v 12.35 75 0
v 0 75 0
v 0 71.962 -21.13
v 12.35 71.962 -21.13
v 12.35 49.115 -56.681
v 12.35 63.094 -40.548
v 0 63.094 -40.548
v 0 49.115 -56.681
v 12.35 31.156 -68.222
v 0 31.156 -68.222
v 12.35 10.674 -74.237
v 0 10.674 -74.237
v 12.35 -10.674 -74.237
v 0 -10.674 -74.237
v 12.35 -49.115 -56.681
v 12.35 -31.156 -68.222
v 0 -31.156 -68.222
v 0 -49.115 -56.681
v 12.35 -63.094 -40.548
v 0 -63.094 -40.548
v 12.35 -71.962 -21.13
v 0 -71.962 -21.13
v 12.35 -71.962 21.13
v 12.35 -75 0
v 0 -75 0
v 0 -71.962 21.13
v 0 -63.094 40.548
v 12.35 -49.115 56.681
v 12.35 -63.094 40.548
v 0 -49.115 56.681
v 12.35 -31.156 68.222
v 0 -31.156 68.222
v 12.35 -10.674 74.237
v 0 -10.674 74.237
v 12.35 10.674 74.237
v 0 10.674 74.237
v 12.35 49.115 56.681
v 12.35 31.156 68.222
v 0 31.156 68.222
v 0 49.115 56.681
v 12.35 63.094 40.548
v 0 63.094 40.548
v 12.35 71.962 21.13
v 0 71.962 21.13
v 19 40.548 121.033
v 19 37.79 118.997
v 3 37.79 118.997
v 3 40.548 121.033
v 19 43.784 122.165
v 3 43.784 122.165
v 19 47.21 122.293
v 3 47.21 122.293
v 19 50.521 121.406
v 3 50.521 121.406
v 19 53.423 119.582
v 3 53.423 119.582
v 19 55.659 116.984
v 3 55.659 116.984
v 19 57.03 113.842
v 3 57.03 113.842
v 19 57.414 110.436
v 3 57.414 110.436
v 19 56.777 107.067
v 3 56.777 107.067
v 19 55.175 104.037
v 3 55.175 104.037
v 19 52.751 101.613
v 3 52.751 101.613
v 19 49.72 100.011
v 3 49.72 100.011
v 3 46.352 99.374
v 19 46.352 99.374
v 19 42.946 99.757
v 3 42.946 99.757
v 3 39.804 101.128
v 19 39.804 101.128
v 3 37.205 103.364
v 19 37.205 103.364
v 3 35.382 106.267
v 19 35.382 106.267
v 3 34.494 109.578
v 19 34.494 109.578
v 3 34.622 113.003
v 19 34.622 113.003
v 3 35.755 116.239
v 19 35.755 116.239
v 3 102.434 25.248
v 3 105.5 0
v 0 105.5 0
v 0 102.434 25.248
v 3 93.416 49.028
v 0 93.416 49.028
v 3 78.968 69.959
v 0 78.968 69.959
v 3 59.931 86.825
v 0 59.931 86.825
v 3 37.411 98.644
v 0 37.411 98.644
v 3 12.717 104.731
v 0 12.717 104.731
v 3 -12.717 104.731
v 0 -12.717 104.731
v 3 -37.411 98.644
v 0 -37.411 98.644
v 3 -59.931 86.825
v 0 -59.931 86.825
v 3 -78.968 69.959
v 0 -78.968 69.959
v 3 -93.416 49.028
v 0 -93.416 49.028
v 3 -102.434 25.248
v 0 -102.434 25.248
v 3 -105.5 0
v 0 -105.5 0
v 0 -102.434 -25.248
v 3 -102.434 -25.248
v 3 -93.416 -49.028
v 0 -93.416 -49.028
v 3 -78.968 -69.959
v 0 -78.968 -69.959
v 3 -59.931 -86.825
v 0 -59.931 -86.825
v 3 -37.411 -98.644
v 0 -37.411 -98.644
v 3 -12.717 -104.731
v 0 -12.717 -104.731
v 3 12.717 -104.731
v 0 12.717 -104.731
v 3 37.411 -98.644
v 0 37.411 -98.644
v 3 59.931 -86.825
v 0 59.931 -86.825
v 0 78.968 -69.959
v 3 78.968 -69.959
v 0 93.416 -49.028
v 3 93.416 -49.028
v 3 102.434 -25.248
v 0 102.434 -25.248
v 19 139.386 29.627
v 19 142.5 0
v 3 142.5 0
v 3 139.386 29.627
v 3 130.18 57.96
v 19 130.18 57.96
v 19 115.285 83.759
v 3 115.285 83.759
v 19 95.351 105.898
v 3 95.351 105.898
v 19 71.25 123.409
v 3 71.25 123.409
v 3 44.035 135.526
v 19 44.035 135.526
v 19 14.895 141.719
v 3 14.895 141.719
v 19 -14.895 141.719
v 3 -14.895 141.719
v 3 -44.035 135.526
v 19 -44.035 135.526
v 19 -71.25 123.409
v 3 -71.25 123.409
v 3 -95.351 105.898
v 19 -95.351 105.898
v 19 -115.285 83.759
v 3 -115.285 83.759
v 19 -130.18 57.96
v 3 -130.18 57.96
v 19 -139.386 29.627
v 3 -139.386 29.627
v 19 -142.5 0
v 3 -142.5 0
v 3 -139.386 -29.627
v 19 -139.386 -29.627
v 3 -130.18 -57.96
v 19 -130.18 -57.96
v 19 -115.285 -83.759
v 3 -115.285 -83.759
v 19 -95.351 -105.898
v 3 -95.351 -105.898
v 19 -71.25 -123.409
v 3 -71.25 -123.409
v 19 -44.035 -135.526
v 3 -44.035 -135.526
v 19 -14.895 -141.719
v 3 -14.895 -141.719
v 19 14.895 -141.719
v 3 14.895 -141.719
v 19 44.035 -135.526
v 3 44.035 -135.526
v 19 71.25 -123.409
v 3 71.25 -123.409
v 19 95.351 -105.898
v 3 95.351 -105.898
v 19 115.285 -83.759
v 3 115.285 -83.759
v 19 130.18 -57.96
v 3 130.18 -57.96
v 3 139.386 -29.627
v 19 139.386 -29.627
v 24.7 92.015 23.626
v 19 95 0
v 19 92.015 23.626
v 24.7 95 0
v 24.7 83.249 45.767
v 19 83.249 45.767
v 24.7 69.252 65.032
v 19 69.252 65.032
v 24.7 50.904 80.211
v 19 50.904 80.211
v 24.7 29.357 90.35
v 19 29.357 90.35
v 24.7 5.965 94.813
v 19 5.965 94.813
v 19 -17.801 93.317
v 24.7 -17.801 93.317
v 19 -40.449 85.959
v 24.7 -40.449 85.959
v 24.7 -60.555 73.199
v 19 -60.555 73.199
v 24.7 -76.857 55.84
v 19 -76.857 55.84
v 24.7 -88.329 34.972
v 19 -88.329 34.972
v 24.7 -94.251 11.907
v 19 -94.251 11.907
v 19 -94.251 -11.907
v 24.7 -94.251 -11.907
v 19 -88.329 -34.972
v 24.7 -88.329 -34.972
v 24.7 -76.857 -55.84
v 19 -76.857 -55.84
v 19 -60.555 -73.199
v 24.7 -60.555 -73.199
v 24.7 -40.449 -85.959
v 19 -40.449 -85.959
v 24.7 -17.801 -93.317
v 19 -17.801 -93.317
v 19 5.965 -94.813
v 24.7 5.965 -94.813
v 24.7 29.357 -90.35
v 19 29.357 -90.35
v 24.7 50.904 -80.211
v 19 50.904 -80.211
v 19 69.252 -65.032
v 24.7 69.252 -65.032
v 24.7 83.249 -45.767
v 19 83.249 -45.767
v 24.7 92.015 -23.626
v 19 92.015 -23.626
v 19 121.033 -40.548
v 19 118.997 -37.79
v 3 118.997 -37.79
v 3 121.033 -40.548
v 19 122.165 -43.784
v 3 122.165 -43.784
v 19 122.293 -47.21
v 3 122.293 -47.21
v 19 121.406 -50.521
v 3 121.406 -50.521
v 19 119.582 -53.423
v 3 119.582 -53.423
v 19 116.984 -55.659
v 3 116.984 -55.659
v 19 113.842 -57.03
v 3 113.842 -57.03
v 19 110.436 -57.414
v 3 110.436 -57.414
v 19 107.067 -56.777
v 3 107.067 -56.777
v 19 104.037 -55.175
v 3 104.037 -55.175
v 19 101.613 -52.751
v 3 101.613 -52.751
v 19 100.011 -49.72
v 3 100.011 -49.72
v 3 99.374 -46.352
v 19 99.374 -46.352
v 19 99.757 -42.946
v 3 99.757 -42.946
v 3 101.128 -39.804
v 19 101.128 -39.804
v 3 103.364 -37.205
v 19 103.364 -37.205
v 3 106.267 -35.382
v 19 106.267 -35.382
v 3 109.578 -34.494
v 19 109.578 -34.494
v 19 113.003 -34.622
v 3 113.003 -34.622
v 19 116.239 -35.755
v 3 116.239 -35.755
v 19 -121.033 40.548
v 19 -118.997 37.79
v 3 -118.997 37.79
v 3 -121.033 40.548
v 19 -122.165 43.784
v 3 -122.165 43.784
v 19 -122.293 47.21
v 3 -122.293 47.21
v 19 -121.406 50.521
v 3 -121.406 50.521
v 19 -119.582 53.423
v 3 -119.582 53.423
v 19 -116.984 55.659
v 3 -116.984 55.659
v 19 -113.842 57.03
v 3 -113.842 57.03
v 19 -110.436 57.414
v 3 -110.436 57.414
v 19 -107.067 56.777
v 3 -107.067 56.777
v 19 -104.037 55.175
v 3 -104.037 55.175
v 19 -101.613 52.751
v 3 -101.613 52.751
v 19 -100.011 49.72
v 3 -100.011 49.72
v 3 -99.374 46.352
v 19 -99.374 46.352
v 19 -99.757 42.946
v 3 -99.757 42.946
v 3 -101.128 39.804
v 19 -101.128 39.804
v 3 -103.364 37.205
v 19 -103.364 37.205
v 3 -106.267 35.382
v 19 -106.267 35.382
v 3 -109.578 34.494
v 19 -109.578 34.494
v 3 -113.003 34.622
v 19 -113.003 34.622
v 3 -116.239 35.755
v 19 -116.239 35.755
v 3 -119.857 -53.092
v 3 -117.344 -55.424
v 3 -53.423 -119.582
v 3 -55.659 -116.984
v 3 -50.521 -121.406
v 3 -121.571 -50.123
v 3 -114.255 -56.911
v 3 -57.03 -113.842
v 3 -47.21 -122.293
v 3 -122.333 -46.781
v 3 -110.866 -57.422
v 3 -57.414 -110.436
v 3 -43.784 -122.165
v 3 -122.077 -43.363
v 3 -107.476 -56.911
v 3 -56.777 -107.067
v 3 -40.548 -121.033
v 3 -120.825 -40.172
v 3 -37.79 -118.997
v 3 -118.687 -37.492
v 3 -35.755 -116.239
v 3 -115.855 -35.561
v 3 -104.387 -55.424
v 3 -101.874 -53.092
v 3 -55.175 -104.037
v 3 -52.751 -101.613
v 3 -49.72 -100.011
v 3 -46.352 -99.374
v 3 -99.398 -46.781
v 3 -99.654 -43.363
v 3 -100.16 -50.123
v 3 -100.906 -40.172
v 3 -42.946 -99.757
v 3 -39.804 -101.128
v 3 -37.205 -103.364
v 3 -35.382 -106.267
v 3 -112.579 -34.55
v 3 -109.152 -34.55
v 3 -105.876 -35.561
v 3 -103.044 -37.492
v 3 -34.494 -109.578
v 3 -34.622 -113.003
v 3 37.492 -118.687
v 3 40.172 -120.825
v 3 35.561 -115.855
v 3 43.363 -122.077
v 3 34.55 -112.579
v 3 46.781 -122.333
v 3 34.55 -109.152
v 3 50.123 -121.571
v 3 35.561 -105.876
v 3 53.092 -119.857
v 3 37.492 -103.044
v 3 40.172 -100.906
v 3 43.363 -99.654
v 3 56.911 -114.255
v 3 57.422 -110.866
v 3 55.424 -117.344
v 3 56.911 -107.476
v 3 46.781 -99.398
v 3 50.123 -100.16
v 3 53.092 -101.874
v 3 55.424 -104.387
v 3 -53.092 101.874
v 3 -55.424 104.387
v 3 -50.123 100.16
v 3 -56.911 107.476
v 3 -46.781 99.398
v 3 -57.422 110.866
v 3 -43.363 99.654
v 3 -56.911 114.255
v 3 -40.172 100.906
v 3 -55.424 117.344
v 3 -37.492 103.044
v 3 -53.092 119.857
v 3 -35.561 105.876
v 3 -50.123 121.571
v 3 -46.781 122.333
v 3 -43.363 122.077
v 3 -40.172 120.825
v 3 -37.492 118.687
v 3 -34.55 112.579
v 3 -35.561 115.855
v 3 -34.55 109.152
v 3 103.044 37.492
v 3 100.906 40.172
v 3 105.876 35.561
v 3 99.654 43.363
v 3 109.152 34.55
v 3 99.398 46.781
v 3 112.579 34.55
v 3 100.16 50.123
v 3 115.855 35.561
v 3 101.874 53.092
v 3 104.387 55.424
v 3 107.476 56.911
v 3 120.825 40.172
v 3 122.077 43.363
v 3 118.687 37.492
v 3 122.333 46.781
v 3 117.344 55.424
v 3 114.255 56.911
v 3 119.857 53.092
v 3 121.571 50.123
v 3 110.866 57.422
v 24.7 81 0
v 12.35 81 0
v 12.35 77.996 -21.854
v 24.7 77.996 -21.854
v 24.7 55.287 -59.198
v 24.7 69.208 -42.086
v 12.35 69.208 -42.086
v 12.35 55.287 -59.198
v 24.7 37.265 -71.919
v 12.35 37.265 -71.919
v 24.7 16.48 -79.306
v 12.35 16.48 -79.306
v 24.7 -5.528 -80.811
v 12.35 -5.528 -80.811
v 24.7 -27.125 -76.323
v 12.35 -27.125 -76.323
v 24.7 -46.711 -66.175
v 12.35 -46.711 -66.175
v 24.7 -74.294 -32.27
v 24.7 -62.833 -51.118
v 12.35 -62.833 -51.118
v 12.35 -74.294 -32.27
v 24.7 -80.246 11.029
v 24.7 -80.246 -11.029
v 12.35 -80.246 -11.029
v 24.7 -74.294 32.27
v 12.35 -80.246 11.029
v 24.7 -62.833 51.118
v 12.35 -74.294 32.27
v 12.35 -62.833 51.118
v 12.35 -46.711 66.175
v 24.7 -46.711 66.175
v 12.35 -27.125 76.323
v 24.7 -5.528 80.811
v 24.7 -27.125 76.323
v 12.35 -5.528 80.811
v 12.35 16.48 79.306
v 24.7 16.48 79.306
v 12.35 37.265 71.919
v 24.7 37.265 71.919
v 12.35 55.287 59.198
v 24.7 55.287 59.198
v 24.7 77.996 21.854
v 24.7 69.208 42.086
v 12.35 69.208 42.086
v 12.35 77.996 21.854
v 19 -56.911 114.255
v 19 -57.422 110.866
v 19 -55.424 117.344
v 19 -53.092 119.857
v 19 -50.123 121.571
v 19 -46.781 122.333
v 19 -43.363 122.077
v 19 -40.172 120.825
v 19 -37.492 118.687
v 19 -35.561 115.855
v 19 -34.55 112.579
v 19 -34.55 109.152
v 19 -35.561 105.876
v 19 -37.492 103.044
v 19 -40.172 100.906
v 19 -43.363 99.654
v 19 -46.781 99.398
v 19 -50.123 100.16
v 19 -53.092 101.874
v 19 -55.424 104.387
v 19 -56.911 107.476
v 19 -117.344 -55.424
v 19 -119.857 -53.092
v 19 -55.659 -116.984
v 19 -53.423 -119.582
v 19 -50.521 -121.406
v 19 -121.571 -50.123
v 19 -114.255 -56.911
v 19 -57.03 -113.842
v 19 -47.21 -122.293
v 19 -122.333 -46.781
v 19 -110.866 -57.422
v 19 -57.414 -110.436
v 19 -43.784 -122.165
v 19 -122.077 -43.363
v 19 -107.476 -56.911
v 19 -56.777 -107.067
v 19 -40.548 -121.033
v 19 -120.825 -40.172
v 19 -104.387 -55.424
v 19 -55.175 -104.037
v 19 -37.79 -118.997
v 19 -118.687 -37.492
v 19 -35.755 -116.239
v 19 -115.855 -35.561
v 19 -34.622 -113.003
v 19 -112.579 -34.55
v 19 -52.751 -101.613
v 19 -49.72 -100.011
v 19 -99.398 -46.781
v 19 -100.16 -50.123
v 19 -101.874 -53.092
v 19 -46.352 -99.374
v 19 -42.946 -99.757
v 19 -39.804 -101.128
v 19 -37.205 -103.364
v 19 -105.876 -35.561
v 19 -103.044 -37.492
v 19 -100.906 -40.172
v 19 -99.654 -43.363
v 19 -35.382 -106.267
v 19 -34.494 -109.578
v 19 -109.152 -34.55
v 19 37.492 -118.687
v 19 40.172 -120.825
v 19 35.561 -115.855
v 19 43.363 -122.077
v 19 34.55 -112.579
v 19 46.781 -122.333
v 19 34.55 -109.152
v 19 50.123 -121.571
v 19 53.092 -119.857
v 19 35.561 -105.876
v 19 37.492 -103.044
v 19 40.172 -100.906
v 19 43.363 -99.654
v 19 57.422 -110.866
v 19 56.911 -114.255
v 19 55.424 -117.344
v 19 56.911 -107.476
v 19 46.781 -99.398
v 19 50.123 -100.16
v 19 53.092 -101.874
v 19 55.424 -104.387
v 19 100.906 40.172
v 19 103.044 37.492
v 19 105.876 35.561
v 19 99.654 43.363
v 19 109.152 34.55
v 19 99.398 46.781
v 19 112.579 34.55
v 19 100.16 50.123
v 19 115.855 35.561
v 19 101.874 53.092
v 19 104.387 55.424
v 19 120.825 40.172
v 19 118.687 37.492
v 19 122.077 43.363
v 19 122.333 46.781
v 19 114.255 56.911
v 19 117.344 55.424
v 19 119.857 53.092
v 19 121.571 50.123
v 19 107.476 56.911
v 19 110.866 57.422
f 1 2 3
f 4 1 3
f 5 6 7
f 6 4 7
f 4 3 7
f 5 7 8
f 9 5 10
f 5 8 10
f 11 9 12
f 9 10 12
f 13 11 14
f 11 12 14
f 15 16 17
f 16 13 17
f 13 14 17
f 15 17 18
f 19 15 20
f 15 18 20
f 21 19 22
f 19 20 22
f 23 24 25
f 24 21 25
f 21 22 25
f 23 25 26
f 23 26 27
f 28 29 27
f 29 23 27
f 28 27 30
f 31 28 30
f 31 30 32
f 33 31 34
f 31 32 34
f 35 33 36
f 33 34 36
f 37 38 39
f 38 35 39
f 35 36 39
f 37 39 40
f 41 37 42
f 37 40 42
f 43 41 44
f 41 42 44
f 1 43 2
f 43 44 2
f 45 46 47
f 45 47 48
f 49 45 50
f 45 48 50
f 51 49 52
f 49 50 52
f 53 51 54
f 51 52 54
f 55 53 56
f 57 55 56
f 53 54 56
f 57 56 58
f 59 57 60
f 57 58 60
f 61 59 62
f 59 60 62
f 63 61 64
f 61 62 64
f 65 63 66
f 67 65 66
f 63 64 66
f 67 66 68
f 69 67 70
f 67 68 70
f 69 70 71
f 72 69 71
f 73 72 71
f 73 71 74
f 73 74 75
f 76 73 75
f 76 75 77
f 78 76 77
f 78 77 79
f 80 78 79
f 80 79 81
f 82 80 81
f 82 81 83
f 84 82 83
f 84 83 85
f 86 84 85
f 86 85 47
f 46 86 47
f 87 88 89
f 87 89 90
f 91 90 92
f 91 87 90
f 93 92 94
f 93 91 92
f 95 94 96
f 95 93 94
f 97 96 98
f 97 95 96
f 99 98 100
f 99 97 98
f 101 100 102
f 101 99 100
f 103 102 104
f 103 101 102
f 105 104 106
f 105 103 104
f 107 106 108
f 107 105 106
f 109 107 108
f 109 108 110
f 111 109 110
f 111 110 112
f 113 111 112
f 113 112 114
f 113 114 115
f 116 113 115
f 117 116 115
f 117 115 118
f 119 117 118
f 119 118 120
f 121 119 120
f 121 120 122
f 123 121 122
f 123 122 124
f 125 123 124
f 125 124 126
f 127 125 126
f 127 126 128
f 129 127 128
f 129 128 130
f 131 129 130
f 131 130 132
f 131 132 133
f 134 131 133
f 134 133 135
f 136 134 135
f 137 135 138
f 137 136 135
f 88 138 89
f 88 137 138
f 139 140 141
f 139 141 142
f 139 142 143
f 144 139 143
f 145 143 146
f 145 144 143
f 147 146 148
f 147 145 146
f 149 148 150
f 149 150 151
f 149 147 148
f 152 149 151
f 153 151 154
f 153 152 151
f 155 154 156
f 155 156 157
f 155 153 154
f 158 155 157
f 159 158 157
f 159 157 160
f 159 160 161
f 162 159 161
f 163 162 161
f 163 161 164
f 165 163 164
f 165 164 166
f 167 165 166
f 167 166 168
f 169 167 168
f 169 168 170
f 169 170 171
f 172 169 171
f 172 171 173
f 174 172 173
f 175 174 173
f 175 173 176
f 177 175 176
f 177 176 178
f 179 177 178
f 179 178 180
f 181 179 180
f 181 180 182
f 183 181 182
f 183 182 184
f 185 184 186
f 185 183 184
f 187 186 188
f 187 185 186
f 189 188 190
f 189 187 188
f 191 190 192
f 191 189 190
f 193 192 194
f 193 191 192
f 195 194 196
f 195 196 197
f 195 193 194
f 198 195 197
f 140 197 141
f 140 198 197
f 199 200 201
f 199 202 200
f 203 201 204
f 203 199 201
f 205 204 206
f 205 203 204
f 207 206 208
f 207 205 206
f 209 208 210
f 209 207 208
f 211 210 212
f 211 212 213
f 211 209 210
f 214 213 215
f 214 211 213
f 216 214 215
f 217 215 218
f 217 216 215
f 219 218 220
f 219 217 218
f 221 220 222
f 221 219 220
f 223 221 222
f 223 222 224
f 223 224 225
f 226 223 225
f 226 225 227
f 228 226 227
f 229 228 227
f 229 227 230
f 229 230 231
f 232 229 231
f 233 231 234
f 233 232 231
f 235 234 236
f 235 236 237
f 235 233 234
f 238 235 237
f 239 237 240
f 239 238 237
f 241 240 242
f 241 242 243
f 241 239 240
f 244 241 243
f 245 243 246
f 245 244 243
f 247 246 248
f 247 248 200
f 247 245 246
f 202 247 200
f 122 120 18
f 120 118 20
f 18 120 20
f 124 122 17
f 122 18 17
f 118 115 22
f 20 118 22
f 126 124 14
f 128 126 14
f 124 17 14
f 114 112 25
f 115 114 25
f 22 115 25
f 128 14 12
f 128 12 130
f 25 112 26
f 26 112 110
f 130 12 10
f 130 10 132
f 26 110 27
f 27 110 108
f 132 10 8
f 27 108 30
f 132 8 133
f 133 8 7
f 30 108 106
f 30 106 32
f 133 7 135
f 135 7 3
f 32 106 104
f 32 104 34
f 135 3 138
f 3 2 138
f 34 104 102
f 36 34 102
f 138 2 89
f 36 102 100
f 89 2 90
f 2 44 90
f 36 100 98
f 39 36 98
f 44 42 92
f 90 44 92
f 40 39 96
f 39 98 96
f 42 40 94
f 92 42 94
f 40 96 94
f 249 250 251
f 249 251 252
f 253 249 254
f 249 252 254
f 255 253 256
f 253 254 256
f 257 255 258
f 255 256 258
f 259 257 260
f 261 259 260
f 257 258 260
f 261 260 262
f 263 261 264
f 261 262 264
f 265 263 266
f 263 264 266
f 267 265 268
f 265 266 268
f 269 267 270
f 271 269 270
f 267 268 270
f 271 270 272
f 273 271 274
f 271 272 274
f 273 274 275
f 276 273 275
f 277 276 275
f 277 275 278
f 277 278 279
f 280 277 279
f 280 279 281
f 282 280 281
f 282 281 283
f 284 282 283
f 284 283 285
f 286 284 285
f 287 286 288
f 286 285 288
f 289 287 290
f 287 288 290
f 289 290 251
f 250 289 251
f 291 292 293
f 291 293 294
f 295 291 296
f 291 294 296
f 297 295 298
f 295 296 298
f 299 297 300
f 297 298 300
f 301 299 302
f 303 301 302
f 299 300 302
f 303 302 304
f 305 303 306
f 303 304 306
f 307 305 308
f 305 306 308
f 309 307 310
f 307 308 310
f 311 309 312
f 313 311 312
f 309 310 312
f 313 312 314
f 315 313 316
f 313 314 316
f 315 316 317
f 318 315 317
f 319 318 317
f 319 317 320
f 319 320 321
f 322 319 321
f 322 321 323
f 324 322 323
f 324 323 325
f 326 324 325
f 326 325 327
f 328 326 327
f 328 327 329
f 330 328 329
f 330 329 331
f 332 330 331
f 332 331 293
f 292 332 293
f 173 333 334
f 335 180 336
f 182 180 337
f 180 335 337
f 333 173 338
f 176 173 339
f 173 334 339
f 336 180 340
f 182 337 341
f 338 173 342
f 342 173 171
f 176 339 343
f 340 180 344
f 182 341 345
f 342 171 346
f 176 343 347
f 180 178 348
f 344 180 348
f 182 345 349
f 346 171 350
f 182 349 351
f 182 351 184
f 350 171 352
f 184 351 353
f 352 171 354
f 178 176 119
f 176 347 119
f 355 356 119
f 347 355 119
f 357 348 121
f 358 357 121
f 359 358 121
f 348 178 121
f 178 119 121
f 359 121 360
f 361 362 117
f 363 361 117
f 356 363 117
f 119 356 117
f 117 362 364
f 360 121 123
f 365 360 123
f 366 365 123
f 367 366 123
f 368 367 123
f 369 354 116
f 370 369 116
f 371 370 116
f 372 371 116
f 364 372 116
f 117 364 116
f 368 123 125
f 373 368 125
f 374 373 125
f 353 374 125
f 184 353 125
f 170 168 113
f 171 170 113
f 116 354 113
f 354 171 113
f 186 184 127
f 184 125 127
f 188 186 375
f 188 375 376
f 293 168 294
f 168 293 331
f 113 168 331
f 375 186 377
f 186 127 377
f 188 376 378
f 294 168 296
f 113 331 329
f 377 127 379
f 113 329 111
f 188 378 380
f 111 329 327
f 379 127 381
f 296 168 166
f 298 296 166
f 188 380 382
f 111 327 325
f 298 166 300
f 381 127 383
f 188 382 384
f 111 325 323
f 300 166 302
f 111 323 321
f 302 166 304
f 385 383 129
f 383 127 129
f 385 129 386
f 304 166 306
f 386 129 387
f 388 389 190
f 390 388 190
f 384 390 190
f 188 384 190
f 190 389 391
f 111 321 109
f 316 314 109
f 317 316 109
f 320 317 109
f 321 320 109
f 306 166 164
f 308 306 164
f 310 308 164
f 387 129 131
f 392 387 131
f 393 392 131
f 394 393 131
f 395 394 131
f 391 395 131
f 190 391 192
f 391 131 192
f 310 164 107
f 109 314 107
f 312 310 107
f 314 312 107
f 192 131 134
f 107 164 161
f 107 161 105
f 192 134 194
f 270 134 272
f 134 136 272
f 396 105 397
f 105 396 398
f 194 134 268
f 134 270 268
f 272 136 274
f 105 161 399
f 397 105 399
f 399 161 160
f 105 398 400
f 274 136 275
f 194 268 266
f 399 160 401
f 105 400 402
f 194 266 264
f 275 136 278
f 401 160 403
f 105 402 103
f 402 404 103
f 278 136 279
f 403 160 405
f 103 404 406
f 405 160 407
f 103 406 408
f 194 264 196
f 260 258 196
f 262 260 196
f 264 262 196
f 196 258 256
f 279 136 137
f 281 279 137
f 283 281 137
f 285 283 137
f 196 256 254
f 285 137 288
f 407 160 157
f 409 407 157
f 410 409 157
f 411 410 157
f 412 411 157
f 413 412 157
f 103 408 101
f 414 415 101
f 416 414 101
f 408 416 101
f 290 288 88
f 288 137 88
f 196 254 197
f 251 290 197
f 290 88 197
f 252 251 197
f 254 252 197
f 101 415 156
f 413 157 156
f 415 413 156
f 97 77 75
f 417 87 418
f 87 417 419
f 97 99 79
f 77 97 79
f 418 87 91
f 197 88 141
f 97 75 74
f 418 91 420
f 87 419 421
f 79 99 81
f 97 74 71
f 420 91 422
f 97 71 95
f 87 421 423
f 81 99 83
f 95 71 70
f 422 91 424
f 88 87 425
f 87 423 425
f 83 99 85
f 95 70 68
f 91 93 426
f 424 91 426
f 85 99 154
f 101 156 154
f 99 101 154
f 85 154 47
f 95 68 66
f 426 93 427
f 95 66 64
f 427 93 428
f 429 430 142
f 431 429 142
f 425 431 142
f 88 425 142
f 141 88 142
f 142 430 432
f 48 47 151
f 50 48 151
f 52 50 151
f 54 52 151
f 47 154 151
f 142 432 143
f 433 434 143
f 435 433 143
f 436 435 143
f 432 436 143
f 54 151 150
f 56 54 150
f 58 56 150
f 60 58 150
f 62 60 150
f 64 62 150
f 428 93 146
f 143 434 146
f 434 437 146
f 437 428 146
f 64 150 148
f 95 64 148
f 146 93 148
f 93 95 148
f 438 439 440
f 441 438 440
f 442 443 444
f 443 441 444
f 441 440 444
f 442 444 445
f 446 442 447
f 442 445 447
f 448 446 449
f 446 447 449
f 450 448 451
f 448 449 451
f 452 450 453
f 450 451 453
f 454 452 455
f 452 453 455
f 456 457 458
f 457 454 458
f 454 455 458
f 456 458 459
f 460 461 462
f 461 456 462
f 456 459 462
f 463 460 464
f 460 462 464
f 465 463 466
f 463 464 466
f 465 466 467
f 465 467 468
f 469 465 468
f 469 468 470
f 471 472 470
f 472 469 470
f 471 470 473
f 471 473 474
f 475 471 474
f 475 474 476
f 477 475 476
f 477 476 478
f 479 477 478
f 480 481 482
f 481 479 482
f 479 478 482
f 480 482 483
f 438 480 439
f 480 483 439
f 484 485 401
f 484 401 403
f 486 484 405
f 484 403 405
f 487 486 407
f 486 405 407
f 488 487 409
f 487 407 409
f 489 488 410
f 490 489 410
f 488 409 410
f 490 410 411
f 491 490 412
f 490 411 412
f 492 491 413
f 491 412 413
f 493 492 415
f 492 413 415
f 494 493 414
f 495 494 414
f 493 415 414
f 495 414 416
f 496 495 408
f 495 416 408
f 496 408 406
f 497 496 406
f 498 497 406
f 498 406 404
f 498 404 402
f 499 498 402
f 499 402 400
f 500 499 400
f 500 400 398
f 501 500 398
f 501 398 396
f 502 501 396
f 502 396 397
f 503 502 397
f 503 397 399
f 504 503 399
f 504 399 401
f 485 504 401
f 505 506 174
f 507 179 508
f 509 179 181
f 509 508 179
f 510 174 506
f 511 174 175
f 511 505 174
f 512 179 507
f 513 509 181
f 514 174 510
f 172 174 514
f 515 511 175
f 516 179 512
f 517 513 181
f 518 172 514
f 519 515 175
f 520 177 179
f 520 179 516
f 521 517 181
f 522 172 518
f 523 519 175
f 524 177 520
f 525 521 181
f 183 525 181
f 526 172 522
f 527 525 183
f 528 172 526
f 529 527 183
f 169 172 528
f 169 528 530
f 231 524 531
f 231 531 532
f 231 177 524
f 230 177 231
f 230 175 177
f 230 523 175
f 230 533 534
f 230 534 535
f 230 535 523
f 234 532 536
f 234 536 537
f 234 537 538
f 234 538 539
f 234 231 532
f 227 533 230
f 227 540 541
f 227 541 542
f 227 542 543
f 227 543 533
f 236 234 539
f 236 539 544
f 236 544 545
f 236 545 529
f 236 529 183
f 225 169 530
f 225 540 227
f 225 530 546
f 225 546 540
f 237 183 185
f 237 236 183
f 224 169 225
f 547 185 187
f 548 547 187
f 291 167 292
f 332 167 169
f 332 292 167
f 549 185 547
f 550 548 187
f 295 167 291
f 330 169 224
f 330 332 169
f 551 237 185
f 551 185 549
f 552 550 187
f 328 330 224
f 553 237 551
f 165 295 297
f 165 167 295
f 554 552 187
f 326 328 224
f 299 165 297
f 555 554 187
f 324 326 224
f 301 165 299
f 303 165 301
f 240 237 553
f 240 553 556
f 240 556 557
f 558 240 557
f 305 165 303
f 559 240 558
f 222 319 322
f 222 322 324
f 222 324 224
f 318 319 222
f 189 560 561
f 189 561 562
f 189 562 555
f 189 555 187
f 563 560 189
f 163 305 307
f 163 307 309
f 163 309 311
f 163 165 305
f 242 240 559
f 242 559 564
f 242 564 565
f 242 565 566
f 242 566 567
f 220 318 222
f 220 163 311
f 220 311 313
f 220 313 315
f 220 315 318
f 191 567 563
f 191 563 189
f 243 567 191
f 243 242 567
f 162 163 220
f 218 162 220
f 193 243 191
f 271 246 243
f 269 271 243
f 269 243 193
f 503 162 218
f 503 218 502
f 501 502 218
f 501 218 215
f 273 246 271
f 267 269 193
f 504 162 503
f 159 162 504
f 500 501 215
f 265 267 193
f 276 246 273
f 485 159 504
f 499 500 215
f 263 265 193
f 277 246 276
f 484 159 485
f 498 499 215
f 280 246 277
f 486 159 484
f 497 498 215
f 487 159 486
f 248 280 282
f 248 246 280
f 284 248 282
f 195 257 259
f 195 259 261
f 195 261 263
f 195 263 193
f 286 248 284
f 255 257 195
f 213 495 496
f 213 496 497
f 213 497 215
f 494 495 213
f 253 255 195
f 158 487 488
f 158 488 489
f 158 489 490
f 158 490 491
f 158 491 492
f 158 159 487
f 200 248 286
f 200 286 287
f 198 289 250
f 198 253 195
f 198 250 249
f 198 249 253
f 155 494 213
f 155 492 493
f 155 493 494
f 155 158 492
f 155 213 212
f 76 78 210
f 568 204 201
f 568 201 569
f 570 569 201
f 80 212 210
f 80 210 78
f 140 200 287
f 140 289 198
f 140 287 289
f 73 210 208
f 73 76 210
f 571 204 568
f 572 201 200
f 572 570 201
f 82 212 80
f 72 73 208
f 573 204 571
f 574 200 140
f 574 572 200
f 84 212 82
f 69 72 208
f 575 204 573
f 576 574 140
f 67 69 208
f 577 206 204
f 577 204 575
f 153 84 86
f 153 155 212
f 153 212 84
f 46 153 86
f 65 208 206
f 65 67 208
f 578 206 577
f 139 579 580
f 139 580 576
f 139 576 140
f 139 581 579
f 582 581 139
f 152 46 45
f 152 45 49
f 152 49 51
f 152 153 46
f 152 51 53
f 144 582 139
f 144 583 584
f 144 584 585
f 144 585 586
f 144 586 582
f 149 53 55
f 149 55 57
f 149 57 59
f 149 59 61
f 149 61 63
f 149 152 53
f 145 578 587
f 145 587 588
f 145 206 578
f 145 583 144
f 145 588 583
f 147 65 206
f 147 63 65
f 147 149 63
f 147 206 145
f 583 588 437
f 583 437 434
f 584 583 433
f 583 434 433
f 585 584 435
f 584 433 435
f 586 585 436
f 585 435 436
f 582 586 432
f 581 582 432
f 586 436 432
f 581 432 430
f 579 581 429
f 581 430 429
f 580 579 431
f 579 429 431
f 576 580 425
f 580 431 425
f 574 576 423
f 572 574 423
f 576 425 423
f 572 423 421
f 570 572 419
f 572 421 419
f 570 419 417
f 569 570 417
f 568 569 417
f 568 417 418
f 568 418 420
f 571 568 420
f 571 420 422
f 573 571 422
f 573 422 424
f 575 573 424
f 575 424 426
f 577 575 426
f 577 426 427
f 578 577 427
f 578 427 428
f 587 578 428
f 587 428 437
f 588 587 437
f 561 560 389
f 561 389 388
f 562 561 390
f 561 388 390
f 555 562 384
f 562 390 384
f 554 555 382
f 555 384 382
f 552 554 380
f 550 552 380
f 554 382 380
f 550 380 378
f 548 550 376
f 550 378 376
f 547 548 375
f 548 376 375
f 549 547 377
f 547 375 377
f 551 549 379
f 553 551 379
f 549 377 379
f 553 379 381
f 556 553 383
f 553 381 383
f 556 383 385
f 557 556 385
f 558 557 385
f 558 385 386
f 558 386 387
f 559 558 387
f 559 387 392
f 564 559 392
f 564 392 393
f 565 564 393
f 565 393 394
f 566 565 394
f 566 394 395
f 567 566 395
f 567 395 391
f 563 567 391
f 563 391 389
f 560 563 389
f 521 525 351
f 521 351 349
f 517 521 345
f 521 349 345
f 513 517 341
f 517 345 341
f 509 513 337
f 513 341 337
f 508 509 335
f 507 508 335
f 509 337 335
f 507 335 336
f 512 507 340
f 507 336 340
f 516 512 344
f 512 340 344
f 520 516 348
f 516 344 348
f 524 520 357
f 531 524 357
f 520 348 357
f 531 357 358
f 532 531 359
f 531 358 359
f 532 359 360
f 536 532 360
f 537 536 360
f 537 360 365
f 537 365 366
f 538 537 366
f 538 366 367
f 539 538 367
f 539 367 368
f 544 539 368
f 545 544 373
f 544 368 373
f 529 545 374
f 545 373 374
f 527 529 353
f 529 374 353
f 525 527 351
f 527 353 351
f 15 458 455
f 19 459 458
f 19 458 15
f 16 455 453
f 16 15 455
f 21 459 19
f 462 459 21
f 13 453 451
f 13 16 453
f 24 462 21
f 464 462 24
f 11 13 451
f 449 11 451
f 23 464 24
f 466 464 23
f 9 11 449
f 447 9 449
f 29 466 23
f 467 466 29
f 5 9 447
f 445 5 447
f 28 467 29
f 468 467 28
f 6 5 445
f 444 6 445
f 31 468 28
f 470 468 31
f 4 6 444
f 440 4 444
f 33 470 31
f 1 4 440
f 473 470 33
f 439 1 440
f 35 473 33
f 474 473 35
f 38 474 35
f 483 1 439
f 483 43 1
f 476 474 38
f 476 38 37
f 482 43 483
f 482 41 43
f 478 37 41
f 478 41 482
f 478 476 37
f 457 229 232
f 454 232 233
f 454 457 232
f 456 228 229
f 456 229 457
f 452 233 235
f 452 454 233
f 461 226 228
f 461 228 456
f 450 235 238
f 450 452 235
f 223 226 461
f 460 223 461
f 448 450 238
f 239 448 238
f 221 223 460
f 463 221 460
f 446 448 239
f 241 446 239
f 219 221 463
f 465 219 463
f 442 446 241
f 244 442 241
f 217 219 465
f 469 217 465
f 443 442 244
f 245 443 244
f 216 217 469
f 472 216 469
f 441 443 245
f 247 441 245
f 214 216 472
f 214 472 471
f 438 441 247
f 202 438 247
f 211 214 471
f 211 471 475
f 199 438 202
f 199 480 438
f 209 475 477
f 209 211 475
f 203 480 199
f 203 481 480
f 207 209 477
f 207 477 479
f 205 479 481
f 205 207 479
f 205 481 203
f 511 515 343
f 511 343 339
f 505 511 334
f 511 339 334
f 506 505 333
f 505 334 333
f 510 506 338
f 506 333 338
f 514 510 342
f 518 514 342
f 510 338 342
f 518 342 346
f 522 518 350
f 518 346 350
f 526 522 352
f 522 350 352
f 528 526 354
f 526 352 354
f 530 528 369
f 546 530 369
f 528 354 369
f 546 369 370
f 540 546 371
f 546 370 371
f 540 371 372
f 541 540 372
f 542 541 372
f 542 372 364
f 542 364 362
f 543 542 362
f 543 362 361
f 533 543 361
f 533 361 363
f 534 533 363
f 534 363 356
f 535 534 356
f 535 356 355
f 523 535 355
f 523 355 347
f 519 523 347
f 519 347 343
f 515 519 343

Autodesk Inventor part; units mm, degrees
ref_plane "YZ Plane" through (0, 0, 0) normal (1, 0, 0) x (0, 1, 0)
ref_plane "XZ Plane" through (0, 0, 0) normal (0, 1, 0) x (-1, 0, 0)
ref_plane "XY Plane" through (0, 0, 0) normal (0, 0, 1) x (1, 0, 0)
sketch "Sketch1" plane through (0, 0, 0) normal (0, 0, 1) x (1, 0, 0)
  line L0 (0, 0) -> (24.7, 0) construction
  line L1 (0, 105.5) -> (3, 105.5)
  line L2 (3, 142.5) -> (19, 142.5)
  line L3 (3, 142.5) -> (3, 105.5)
  line L4 (19, 142.5) -> (19, 95)
  line L5 (24.7, 81) -> (24.7, 0) construction
  line L6 (19, 95) -> (24.7, 95)
  line L7 (24.7, 95) -> (24.7, 81)
  line L8 (24.7, 81) -> (12.35, 81)
  line L9 (12.35, 81) -> (12.35, 75)
  line L10 (12.35, 75) -> (0, 75)
  line L11 (0, 75) -> (0, 0) construction
  line L12 (0, 105.5) -> (0, 75)
  dimension "d0" = 211
  dimension "d1" = 285
  dimension "d2" = 190
  dimension "d7" = 162
  dimension "d8" = 150
  dimension "d9" = 19
  dimension "d10" = 3
  dimension "d12" = 12.35
  dimension "d13" = 24.7
revolve "Revolution1" add sketch "Sketch1" angle 360 about axis through (0, 0, 0) along (1, 0, 0)
sketch "Sketch2" plane through (3, 0, 0) normal (-1, 0, 0) x (0, 0, 1)
  circle A0 centre (0, 0) radius 105.5 projected
  line L0 (0, 0) -> (0, 120) construction
  circle A1 centre (0, 0) radius 142.5 projected
  circle A2 centre (0, 0) radius 120 construction
  line L1 (0, 0) -> (45.922, 110.8655) construction
  circle A3 centre (45.922, 110.8655) radius 11.5
  dimension "d14" = 23
  dimension "d15" = 120
  dimension "d16" = 22.5
extrude "Extrusion1" cut sketch "Sketch2" against normal blind 19 contours A3
pattern_circular "Circular Pattern1" count 8 over 360 about axis through (1.5, 0, 0) along (1, 0, 0) of "Extrusion1"
equation "\"d0\" = D1"
equation "\"d1\" = D"
equation "\"d2\" = N3"
equation "\"d7\" = ID + 2 * t"
equation "\"d8\" = ID"
equation "\"d9\" = C1"
equation "\"d10\" = F1"
equation "\"d12\" = 0.65 * C1"
equation "\"d13\" = 1.3 * C1"
equation "\"d14\" = L"
equation "\"d15\" = 0.5 * K1"
equation "\"d3\" = C1"
equation "\"C1\" = 19"
equation "\"D\" = 285"
equation "\"L\" = 23"
equation "\"N3\" = 190"
equation "\"D1\" = 211"
equation "\"H1\" = 17"
equation "\"F1\" = 3"
equation "\"ID\" = 150"
equation "\"t\" = 6"
equation "\"Size_Designation\" = 1.2345"
equation "\"K1\" = 240"
properties part number "DIN EN 1092-2 Hubbed Socket Welding Flange Type 14 - PN 16 Ductile Iron DN150" material "Iron, Ductile"
